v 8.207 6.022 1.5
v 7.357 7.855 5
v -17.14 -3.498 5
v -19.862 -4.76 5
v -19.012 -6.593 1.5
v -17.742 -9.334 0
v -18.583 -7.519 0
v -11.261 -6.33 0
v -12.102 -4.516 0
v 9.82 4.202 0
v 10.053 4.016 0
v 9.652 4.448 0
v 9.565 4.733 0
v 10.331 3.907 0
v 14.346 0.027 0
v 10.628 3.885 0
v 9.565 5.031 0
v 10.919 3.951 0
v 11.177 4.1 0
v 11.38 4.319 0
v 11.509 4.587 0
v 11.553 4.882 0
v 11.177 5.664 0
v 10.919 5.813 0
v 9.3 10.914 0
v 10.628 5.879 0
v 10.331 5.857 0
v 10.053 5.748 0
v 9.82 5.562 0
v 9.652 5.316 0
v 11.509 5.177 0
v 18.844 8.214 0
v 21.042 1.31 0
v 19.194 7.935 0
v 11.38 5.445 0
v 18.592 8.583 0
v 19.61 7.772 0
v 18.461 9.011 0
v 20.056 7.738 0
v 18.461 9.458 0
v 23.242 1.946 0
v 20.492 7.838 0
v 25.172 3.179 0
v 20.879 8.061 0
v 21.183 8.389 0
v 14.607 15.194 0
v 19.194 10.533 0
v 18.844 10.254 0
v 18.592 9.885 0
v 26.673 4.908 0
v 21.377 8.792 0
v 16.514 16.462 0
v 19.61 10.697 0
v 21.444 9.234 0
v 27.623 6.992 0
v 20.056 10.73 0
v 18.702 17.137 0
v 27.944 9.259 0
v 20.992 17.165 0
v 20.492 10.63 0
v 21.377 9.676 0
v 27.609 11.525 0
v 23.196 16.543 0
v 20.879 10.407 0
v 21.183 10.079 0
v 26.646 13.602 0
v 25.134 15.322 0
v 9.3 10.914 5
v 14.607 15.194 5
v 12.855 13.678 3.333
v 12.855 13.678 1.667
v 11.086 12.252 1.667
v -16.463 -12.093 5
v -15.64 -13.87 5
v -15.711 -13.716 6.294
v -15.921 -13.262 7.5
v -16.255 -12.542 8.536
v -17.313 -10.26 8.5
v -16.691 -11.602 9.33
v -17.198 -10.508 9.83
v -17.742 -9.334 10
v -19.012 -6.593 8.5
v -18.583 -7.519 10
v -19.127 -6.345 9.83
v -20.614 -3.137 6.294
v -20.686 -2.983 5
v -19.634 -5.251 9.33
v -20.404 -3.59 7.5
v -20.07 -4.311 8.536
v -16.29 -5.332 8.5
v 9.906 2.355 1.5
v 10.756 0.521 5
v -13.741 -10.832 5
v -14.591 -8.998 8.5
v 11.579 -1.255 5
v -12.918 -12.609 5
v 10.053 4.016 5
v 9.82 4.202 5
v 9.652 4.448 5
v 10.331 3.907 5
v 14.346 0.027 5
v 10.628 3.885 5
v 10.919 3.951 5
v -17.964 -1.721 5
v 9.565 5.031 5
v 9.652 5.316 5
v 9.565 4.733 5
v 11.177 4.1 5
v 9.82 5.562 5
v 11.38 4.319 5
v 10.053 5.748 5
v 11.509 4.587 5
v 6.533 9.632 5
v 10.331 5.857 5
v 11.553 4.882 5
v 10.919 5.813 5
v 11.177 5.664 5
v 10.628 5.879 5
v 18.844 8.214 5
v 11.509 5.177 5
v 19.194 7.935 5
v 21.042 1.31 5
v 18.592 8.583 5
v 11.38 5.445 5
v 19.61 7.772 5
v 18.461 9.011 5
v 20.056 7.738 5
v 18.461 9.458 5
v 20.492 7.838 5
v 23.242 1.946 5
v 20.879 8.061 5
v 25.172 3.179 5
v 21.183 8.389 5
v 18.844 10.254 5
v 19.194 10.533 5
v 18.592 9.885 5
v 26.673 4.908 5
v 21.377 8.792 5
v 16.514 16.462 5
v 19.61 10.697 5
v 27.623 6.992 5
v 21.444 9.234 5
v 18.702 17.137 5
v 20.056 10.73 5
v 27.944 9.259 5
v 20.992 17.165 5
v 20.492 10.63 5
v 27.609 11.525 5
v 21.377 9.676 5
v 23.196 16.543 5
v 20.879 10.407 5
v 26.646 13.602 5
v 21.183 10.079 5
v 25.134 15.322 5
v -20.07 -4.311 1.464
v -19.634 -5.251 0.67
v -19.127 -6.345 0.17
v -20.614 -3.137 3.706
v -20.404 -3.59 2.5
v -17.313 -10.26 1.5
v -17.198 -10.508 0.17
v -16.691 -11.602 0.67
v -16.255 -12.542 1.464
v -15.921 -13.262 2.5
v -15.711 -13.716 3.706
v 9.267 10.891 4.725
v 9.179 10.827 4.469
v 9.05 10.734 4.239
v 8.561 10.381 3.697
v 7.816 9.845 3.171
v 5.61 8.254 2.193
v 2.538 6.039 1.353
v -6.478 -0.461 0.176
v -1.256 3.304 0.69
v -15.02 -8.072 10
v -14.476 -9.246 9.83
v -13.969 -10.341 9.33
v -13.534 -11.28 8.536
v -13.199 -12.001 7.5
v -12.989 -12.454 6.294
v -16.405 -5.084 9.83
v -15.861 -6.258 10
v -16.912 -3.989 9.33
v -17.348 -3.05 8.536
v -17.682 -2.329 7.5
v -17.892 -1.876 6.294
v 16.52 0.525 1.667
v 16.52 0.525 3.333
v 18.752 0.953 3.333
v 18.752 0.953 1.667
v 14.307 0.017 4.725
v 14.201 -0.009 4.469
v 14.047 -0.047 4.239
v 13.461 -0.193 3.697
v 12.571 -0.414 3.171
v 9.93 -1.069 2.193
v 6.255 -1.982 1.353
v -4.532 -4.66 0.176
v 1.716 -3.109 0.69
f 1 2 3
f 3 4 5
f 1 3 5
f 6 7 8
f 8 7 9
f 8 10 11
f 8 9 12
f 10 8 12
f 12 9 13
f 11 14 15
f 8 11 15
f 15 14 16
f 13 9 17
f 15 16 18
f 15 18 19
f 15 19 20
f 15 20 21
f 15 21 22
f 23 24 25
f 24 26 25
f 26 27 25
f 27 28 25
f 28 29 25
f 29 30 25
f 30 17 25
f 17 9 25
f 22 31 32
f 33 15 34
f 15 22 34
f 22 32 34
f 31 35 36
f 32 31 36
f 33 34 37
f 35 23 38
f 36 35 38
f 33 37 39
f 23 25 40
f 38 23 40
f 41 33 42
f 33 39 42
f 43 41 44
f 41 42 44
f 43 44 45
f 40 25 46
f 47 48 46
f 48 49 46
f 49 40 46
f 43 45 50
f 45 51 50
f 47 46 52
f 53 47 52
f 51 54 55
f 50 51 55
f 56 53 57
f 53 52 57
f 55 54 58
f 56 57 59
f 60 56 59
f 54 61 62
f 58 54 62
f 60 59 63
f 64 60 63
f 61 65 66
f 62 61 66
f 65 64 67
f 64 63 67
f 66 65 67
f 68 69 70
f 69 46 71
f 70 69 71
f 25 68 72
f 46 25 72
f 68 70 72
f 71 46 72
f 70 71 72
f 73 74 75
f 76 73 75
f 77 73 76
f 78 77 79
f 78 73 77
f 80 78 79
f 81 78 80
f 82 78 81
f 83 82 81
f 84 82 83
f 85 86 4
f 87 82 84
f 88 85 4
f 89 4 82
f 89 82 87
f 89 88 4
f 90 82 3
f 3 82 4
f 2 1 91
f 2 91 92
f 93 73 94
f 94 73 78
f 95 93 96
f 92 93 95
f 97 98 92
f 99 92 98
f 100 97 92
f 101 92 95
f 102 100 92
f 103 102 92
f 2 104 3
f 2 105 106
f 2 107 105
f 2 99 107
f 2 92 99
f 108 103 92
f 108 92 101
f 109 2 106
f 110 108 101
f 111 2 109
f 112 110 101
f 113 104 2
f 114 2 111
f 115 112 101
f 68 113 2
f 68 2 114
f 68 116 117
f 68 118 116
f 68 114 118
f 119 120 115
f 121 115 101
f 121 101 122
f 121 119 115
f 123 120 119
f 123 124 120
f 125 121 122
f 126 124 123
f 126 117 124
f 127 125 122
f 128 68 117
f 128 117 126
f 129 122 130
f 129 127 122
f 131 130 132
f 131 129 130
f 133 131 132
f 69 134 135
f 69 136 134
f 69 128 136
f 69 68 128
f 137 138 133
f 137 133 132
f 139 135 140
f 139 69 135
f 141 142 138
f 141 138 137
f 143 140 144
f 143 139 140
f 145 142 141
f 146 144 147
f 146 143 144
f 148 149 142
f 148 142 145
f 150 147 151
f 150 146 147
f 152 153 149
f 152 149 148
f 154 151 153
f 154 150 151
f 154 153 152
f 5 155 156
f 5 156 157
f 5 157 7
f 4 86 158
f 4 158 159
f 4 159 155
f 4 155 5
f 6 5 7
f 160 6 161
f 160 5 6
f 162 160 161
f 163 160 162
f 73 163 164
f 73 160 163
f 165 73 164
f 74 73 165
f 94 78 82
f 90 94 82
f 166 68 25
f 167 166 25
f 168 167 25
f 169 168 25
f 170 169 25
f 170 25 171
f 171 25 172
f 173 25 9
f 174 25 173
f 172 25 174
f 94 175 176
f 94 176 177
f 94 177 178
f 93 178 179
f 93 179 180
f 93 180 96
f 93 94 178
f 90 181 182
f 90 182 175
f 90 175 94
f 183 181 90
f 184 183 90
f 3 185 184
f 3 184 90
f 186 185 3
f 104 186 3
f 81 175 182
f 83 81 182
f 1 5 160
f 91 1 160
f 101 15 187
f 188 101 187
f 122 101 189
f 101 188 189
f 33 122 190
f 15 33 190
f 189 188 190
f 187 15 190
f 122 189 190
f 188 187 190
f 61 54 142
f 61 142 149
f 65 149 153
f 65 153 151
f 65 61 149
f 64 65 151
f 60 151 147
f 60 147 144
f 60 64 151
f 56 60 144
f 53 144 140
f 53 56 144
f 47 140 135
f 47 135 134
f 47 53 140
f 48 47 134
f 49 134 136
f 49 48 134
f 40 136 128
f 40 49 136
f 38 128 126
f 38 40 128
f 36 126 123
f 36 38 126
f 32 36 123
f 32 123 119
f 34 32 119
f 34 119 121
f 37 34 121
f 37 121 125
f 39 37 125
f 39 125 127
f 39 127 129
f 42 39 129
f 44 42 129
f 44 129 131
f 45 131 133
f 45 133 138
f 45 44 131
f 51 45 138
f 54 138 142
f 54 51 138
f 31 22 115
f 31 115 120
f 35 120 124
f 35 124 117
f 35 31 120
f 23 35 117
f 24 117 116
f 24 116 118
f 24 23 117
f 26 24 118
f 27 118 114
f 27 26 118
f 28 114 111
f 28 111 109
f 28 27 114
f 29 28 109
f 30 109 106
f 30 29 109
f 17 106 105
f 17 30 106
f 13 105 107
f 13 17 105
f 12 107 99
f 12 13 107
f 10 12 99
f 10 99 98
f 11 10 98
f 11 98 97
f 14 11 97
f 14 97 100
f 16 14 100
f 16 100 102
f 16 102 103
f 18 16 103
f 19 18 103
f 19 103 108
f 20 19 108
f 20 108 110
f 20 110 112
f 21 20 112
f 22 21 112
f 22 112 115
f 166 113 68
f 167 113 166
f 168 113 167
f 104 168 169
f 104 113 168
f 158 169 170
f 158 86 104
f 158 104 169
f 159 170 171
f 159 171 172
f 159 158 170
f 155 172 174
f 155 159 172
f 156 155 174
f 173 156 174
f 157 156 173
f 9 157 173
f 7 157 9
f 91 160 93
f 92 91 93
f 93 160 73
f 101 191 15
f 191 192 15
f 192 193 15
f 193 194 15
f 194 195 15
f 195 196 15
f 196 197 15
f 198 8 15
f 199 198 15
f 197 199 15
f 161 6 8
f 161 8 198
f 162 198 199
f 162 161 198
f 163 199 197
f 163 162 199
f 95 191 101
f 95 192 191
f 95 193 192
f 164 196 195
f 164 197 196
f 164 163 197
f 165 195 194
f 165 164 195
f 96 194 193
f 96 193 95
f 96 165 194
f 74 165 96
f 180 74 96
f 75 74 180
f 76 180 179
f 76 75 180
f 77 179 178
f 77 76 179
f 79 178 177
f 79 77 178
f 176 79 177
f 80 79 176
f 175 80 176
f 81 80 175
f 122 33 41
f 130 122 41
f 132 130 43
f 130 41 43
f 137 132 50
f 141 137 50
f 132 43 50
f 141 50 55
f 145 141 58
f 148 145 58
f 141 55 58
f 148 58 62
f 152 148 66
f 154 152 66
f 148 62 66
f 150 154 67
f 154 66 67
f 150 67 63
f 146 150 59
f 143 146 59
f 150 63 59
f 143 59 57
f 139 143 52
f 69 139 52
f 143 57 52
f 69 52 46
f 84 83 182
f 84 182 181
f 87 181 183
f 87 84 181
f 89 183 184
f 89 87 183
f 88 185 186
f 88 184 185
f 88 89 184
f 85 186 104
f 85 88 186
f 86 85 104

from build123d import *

# Parameters (mm, degrees)
ESQUISSE1_R             = 1.5
ESQUISSE1_R_2           = 1
BOSS_EXTRU_1_DEPTH      = 5
ENL_V_MAT_EXTRU_1_DEPTH = 5
ESQUISSE5_W             = 5
ESQUISSE5_H             = 12
BOSS_EXTRU_2_DEPTH      = 30
CONG_3_START            = -20.022088667
CONG_3_DEPTH            = 7.142932423
CONG_3_START_2          = -12.879156244
CONG_3_2_DEPTH          = 25.906077345
CONG_3_3_OUTLINE_R      = 1
CONG_3_3_OUTLINE_R_2    = 1.5
CONG_3_3_DEPTH          = 5
CONG_4_START            = -20.022088667
CONG_4_DEPTH            = 30
CONG_4_2_DEPTH          = 7.14293242
CONG_4_START_2          = -12.879156247
CONG_4_3_DEPTH          = 25.906077346
CONG_4_4_OUTLINE_R      = 1
CONG_4_4_OUTLINE_R_2    = 1.5
CONG_4_4_DEPTH          = 5
ENL_V_START             = -27
ENL_V_MAT_EXTRU_2_DEPTH = 27
ENL_V_MAT_EXTRU_3_DEPTH = 30


with BuildPart() as part:
    # Esquisse1 → Boss.-Extru.1 (new body)
    with BuildSketch(Plane.XY):
        with BuildLine():
            Line((-22.897983435, -17.234182679), (14.345633901, 0.026586982))
            add(Edge.make_bspline(
                [(14.345633901, 0.026586982), (16.492281726, 0.559482648), (18.723148816, 0.988675042), (21.041646725, 1.309858226)],
                knots=[0, 0, 0, 0, 0.141370549, 0.141370549, 0.141370549, 0.141370549], degree=3))
            ThreePointArc((21.041646725, 1.309858226), (27.202255265, 12.598116604), (14.60702072, 15.193871131))
            add(Edge.make_bspline(
                [(14.60702072, 15.193871131), (12.863335774, 13.632412198), (11.093879733, 12.207631723), (9.299732983, 10.914143371)],
                knots=[0, 0, 0, 0, 0.141370549, 0.141370549, 0.141370549, 0.141370549], degree=3))
            Line((9.299732983, 10.914143371), (-27.943884355, -6.346626291))
            Line((-27.943884355, -6.346626291), (-22.897983435, -17.234182679))
        make_face()
        with Locations((19.943884355, 9.234182671)):
            Circle(ESQUISSE1_R, mode=Mode.SUBTRACT)
        with Locations((10.553366977, 4.882093131)):
            Circle(ESQUISSE1_R_2, mode=Mode.SUBTRACT)
    extrude(amount=BOSS_EXTRU_1_DEPTH)

    # Esquisse2 → Enlèv. mat.-Extru.1 (cut)
    with BuildSketch(Plane.XY.offset(5)):
        Polygon((-53.781292167, 9.271840667), (-26.364947587, 9.271840667), (-1.521431989, -44.333091582), (-53.781292167, -44.333091582), align=None)
    extrude(amount=-ENL_V_MAT_EXTRU_1_DEPTH, mode=Mode.SUBTRACT)

    # Esquisse5 → Boss.-Extru.2 (add)
    with BuildSketch(Plane(origin=(-18.165968268, -8.419122963, 0), x_dir=(0, 0, 1), z_dir=(-0.9072963650485315, -0.42049174304583187, 0))):
        with Locations((7.5, -0.008098332)):
            Rectangle(ESQUISSE5_W, ESQUISSE5_H)
    extrude(amount=-BOSS_EXTRU_2_DEPTH)

    # Congé3: read off the stored shape, not the designer's step
    # Congé3 outline → Congé3 (cut)
    with BuildSketch(Plane(origin=(0, 0, 0), x_dir=(-0.4204917430458318, 0.9072963650485315, 0), z_dir=(0.9072963650485315, 0.4204917430458318, 0)).offset(CONG_3_START)):
        with BuildLine():
            Line((5.991901676, 0), (5.991901676, 5))
            ThreePointArc((5.991901676, 5), (4.527435582, 1.464466094), (0.991901676, 0))
            Line((0.991901676, 0), (5.991901676, 0))
        make_face()
    extrude(amount=CONG_3_DEPTH, mode=Mode.SUBTRACT)

    # Cong_3 2 outline → Cong_3 2 (cut)
    with BuildSketch(Plane(origin=(0, 0, 0), x_dir=(-0.4204917430458318, 0.9072963650485315, 0), z_dir=(0.9072963650485315, 0.4204917430458318, 0)).offset(CONG_3_START_2)):
        with BuildLine():
            Line((5.991901676, 0), (5.991901676, 5))
            ThreePointArc((5.991901676, 5), (4.527435582, 1.464466094), (0.991901676, 0))
            Line((0.991901676, 0), (5.991901676, 0))
        make_face()
    extrude(amount=CONG_3_2_DEPTH, mode=Mode.SUBTRACT)

    # Cong_3 3 outline → Cong_3 3 (add)
    with BuildSketch(Plane.XY):
        with BuildLine():
            Line((-18.583054733, -7.519174178), (-15.639612528, -13.870248741))
            Line((-15.639612528, -13.870248741), (14.345633901, 0.026586982))
            add(Edge.make_bspline(
                [(14.345633901, 0.026586982), (16.492281726, 0.559482648), (18.723148816, 0.988675042), (21.041646725, 1.309858226)],
                knots=[0, 0, 0, 0, 0.141370549, 0.141370549, 0.141370549, 0.141370549], degree=3))
            ThreePointArc((21.041646725, 1.309858226), (27.202255265, 12.598116604), (14.60702072, 15.193871131))
            add(Edge.make_bspline(
                [(14.60702072, 15.193871131), (12.863335774, 13.632412198), (11.093879733, 12.207631723), (9.299732983, 10.914143371), (2.165722649, 5.77088557), (-4.968287685, 0.62762777), (-12.102298019, -4.515630031)],
                knots=[0, 0, 0, 0, 0.141370549, 0.141370549, 0.141370549, 0.703497896, 0.703497896, 0.703497896, 0.703497896], degree=3))
            Line((-12.102298019, -4.515630031), (-18.583054733, -7.519174178))
        make_face()
        with Locations((10.553366977, 4.882093131)):
            Circle(CONG_3_3_OUTLINE_R, mode=Mode.SUBTRACT)
        with Locations((19.943884355, 9.234182671)):
            Circle(CONG_3_3_OUTLINE_R_2, mode=Mode.SUBTRACT)
    extrude(amount=CONG_3_3_DEPTH)

    # Congé4: read off the stored shape, not the designer's step
    # Congé4 outline → Congé4 (cut)
    with BuildSketch(Plane(origin=(0, 0, 0), x_dir=(-0.4204917430458318, 0.9072963650485315, 0), z_dir=(0.9072963650485315, 0.4204917430458318, 0)).offset(CONG_4_START)):
        with BuildLine():
            ThreePointArc((-6.008098332, 5), (-4.543632238, 8.535533906), (-1.008098332, 10))
            Line((-1.008098332, 10), (-6.008098332, 10))
            Line((-6.008098332, 10), (-6.008098332, 5))
        make_face()
        with BuildLine():
            ThreePointArc((0.991901676, 10), (4.527435582, 8.535533906), (5.991901676, 5))
            Line((5.991901676, 5), (5.991901676, 10))
            Line((5.991901676, 10), (0.991901676, 10))
        make_face()
    extrude(amount=CONG_4_DEPTH, mode=Mode.SUBTRACT)

    # Cong_4 2 outline → Cong_4 2 (cut)
    with BuildSketch(Plane(origin=(0, 0, 0), x_dir=(-0.4204917430458318, 0.9072963650485315, 0), z_dir=(0.9072963650485315, 0.4204917430458318, 0)).offset(CONG_4_START)):
        with BuildLine():
            ThreePointArc((-1.008098332, 0), (-4.543632238, 1.464466094), (-6.008098332, 5))
            Line((-6.008098332, 5), (-6.008098332, 0))
            Line((-6.008098332, 0), (-1.008098332, 0))
        make_face()
    extrude(amount=CONG_4_2_DEPTH, mode=Mode.SUBTRACT)

    # Cong_4 3 outline → Cong_4 3 (cut)
    with BuildSketch(Plane(origin=(0, 0, 0), x_dir=(-0.42049174304583214, 0.9072963650485313, 0), z_dir=(0.9072963650485314, 0.42049174304583214, 0)).offset(CONG_4_START_2)):
        with BuildLine():
            ThreePointArc((-1.008098332, 0), (-4.543632238, 1.464466094), (-6.008098332, 5))
            Line((-6.008098332, 5), (-6.008098332, 0))
            Line((-6.008098332, 0), (-1.008098332, 0))
        make_face()
    extrude(amount=CONG_4_3_DEPTH, mode=Mode.SUBTRACT)

    # Cong_4 4 outline → Cong_4 4 (add)
    with BuildSketch(Plane.XY):
        with BuildLine():
            Line((-17.742071243, -9.333766915), (-11.261314532, -6.330222769))
            add(Edge.make_bspline(
                [(-11.261314532, -6.330222769), (-2.725665054, -4.211286186), (5.809984423, -2.092349602), (14.345633901, 0.026586982), (16.492281726, 0.559482648), (18.723148816, 0.988675042), (21.041646725, 1.309858226)],
                knots=[-0.562127348, -0.562127348, -0.562127348, -0.562127348, 0, 0, 0, 0.141370549, 0.141370549, 0.141370549, 0.141370549], degree=3))
            ThreePointArc((21.041646725, 1.309858226), (27.202255265, 12.598116604), (14.60702072, 15.193871131))
            add(Edge.make_bspline(
                [(14.60702072, 15.193871131), (12.863335774, 13.632412198), (11.093879733, 12.207631723), (9.299732983, 10.914143371), (2.165722649, 5.77088557), (-4.968287685, 0.62762777), (-12.102298019, -4.515630031)],
                knots=[0, 0, 0, 0, 0.141370549, 0.141370549, 0.141370549, 0.703497896, 0.703497896, 0.703497896, 0.703497896], degree=3))
            Line((-12.102298019, -4.515630031), (-18.583054733, -7.519174178))
            Line((-18.583054733, -7.519174178), (-17.742071243, -9.333766915))
        make_face()
        with Locations((10.553366977, 4.882093131)):
            Circle(CONG_4_4_OUTLINE_R, mode=Mode.SUBTRACT)
        with Locations((19.943884355, 9.234182671)):
            Circle(CONG_4_4_OUTLINE_R_2, mode=Mode.SUBTRACT)
    extrude(amount=CONG_4_4_DEPTH)

    # Esquisse7 → Enlèv. mat.-Extru.2 (cut)
    with BuildSketch(Plane(origin=(9.052922683, 4.195629328, 0), x_dir=(0, 0, -1), z_dir=(0.9072963650485316, 0.42049174304583187, 0)).offset(ENL_V_START)):
        with BuildLine():
            Line((-10, 0.991901676), (-10, -1.008098332))
            ThreePointArc((-10, -1.008098332), (-8.535533906, -4.543632238), (-5, -6.008098332))
            Line((-5, -6.008098332), (-5, 5.991901668))
            ThreePointArc((-5, 5.991901668), (-8.5355339, 4.527435576), (-10, 0.991901676))
        make_face()
    extrude(amount=ENL_V_MAT_EXTRU_2_DEPTH, mode=Mode.SUBTRACT)

    # Esquisse9 → Enlèv. mat.-Extru.3 (cut)
    with BuildSketch(Plane(origin=(-18.165968268, -8.419122963, 0), x_dir=(0, 0, 1), z_dir=(-0.9072963650485315, -0.42049174304583187, 0))):
        Polygon((1.5, -2.028824274), (5, -4.049550216), (8.5, -2.028824274), (8.5, 2.01262761), (5, 4.033353552), (1.5, 2.01262761), align=None)
    extrude(amount=-ENL_V_MAT_EXTRU_3_DEPTH, mode=Mode.SUBTRACT)


solid = part.part
